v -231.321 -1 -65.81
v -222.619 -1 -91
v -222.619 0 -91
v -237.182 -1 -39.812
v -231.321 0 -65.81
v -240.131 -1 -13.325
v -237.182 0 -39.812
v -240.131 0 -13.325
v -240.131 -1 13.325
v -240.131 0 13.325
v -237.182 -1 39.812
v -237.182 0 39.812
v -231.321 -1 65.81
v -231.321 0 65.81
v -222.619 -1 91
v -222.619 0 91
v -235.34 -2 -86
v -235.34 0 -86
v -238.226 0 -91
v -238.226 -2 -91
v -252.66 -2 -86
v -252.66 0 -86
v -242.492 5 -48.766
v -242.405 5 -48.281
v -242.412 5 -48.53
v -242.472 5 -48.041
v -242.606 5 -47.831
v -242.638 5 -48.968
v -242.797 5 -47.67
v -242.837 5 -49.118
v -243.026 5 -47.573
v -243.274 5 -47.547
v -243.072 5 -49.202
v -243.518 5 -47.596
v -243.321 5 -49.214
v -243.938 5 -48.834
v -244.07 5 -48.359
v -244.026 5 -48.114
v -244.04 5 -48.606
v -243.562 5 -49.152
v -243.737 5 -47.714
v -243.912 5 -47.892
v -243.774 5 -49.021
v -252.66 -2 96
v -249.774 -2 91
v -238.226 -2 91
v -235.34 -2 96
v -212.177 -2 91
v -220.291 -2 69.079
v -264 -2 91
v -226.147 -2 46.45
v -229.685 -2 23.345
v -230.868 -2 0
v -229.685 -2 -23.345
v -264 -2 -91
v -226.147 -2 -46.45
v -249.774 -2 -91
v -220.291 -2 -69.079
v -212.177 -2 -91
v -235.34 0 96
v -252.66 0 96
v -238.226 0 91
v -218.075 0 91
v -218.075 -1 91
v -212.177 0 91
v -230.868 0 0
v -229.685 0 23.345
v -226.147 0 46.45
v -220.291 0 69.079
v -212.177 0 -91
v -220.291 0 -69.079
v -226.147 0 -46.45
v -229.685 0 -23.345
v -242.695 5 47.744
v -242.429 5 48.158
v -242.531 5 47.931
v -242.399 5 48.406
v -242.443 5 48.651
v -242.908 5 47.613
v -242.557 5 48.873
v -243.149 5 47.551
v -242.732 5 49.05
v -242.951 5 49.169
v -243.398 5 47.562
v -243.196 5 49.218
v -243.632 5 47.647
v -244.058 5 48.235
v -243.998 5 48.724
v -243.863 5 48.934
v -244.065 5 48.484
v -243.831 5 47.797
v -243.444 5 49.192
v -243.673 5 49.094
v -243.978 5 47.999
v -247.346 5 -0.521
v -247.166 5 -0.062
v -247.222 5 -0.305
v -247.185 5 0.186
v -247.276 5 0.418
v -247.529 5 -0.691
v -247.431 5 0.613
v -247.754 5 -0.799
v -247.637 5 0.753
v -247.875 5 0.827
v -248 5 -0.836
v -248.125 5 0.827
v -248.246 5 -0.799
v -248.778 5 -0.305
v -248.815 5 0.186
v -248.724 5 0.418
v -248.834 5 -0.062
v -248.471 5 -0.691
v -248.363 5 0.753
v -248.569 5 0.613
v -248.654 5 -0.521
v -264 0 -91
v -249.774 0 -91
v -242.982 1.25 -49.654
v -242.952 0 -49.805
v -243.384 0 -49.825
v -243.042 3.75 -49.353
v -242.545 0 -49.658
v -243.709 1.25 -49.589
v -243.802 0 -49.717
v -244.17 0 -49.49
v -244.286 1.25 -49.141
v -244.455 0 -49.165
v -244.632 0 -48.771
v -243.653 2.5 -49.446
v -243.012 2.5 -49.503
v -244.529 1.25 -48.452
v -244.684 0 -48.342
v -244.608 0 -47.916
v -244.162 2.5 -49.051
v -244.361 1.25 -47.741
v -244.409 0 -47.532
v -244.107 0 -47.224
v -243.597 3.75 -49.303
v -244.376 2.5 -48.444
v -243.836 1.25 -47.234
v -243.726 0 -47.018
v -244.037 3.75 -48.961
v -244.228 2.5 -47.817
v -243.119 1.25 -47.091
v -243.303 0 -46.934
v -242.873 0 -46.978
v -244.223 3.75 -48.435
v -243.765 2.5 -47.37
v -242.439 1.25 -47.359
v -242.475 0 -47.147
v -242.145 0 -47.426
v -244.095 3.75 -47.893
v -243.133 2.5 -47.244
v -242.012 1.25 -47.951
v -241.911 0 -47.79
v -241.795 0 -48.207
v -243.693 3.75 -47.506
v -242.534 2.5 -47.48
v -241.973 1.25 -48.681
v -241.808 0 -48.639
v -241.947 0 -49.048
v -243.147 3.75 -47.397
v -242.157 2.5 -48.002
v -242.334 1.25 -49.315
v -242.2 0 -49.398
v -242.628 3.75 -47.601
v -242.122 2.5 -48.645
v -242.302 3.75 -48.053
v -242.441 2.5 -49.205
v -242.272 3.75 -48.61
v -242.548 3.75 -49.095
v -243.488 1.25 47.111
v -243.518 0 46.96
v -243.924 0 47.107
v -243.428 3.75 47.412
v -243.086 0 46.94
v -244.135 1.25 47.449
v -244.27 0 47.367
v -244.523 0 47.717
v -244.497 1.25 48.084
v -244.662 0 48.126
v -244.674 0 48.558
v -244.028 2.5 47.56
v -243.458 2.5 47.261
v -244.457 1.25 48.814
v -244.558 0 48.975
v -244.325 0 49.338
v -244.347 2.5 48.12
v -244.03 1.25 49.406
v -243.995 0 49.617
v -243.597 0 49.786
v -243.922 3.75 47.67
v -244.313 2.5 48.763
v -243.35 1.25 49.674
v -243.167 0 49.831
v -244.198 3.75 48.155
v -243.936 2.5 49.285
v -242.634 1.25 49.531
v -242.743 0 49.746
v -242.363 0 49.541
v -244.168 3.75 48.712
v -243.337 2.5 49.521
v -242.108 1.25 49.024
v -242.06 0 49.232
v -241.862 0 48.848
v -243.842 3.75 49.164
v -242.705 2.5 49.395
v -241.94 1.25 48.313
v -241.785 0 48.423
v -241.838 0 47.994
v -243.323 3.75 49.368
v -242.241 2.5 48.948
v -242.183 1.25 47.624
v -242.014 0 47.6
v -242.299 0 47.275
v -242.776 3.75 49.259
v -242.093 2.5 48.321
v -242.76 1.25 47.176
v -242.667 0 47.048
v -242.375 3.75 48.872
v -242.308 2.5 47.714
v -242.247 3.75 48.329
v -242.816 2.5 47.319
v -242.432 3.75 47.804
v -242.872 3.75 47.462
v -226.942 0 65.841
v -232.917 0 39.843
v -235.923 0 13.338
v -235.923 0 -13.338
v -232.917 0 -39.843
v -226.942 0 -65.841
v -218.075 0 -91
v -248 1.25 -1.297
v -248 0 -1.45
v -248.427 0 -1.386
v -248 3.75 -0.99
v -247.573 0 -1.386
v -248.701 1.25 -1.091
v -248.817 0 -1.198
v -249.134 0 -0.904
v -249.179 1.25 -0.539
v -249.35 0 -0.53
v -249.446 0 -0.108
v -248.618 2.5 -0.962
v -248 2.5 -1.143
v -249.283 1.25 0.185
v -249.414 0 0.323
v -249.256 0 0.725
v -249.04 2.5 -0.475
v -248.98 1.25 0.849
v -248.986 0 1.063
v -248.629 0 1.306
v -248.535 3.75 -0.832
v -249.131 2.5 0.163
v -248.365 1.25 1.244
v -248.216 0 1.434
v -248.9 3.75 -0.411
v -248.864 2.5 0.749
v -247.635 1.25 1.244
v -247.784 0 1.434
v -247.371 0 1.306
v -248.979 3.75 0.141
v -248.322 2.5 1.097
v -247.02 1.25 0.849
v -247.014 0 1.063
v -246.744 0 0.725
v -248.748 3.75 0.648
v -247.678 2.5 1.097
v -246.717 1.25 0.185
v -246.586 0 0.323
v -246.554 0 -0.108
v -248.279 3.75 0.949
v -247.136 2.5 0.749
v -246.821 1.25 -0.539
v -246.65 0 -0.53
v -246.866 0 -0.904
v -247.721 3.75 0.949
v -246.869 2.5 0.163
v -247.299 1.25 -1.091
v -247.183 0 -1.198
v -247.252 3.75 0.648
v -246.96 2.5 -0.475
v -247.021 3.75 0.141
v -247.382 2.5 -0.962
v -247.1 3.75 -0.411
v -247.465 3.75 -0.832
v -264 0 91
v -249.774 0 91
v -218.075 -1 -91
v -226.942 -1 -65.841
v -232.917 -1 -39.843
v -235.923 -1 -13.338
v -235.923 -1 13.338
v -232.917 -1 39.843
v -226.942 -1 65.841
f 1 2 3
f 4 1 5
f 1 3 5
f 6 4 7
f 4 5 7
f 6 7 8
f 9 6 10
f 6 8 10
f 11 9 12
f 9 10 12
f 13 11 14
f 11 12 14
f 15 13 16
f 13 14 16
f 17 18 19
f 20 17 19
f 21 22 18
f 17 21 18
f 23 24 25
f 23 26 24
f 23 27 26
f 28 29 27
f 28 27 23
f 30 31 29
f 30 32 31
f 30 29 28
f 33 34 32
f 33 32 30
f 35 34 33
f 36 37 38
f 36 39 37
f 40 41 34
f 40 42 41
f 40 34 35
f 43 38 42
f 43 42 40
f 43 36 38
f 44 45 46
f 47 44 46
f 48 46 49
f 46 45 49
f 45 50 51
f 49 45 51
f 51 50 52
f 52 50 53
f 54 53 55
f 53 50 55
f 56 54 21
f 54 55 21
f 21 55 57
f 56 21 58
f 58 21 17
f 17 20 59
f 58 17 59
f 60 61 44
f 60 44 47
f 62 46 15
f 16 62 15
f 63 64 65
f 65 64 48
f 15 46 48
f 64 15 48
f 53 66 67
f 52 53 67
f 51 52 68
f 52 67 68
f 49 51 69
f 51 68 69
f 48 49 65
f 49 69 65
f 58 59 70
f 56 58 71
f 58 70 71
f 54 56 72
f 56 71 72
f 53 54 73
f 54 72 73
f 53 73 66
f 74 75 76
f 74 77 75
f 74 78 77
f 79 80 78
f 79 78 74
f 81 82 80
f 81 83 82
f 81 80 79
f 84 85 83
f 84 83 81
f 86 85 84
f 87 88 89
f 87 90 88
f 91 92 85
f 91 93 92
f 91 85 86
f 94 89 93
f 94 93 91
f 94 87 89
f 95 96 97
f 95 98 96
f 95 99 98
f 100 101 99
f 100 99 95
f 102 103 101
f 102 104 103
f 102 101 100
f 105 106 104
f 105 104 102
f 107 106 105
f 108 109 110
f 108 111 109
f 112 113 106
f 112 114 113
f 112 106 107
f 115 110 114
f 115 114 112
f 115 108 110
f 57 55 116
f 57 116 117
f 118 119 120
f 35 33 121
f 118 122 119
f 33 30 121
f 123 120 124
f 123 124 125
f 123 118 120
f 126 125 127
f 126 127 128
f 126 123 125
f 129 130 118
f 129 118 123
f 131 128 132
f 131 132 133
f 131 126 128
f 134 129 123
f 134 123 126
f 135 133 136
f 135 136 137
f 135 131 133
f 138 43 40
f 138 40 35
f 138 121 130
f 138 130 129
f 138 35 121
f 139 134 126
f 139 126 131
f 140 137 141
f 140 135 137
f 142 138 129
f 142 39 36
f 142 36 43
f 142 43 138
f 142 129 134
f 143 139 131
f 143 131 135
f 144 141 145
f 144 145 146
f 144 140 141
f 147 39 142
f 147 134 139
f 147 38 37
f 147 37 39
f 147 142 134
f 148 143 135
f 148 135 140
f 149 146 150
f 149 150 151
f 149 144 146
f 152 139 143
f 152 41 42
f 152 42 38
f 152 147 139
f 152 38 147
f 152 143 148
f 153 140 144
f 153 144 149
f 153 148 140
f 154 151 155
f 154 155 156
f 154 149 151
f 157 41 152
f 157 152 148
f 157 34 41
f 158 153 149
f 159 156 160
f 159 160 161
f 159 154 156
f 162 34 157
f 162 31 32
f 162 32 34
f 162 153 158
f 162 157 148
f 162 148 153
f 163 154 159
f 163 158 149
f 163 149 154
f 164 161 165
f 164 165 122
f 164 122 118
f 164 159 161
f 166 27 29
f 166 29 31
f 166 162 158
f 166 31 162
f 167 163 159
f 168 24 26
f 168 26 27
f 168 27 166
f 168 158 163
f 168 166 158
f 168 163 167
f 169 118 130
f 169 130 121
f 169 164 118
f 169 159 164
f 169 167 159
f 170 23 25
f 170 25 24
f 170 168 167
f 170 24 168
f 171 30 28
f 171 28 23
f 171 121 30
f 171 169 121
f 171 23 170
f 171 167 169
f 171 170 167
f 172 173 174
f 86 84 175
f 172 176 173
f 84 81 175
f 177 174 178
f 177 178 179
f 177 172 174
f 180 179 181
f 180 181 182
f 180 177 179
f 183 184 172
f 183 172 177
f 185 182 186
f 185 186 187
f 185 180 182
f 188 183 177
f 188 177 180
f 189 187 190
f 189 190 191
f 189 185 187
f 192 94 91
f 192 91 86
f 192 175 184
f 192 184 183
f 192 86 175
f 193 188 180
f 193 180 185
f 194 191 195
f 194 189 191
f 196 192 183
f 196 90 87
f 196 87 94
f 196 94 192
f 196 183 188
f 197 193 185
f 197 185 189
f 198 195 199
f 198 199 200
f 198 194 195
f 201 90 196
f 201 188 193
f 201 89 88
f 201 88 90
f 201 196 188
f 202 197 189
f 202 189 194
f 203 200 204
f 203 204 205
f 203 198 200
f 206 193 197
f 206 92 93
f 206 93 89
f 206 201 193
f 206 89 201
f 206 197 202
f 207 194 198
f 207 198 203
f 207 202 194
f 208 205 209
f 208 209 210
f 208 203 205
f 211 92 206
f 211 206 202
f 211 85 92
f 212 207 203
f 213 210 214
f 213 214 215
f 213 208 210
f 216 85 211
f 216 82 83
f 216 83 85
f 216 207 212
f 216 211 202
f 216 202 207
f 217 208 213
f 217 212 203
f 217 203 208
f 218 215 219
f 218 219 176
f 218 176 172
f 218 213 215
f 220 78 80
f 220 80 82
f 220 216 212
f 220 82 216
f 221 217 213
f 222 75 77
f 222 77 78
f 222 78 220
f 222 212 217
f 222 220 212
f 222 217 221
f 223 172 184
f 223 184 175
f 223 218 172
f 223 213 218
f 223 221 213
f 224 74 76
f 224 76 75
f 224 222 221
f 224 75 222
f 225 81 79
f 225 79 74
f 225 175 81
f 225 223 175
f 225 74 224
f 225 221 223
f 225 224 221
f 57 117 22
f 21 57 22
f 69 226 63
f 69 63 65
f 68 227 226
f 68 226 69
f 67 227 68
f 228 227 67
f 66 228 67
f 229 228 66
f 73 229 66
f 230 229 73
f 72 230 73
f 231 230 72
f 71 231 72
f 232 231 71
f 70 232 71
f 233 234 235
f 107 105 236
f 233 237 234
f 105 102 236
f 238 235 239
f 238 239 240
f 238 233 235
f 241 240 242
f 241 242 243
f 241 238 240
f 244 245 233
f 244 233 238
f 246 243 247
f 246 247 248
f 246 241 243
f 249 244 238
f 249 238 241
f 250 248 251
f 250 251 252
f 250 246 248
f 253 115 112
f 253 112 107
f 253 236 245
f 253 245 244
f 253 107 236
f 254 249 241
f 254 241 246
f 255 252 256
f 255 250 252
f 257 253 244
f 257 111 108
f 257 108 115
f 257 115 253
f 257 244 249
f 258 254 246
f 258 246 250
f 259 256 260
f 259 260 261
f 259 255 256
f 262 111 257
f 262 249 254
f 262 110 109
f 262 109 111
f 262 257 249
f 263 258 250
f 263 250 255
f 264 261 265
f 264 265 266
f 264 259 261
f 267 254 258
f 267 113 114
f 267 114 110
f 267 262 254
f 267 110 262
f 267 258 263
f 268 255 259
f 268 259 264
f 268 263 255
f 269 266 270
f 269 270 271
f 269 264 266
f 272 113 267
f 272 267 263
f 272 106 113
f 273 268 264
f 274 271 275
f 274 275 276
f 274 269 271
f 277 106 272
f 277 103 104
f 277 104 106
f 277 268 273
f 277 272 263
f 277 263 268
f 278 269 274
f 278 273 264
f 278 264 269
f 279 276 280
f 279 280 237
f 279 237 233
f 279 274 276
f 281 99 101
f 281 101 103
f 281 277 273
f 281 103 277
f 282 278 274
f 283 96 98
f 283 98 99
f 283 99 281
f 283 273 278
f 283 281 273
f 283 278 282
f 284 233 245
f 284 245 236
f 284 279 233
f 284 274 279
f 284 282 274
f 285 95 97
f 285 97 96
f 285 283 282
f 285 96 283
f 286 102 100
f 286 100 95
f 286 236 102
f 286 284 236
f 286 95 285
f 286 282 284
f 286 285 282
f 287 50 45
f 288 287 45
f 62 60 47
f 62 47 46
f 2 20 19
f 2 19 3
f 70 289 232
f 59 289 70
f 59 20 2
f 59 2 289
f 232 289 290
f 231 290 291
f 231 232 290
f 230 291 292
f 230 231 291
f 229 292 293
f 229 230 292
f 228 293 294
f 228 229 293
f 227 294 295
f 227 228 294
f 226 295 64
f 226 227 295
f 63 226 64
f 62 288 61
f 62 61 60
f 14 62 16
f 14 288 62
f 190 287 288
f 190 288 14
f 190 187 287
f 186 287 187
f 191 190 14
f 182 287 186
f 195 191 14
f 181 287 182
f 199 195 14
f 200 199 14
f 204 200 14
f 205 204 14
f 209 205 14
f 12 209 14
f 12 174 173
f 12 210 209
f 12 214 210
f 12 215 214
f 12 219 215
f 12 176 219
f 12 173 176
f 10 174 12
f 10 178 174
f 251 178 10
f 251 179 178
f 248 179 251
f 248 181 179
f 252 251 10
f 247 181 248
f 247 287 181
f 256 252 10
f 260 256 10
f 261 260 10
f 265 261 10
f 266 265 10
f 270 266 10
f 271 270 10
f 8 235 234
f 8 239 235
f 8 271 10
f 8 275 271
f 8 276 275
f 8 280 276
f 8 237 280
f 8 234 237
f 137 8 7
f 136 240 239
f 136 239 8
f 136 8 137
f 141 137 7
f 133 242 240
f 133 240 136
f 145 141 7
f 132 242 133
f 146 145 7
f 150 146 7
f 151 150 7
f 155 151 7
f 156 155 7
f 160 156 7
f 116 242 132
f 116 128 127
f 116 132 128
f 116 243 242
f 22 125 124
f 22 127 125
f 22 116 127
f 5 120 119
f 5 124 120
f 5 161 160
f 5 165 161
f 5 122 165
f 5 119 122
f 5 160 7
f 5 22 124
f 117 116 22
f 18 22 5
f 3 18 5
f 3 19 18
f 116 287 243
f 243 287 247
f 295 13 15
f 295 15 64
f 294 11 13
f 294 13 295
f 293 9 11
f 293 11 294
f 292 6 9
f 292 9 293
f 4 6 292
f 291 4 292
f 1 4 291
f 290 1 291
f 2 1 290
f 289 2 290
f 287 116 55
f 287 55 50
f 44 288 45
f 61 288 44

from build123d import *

# Parameters (mm, degrees)
BASEPLATE_PROFILE_DEPTH               = 2
SKETCH2_R                             = 1.45
M3_PINS_DEPTH                         = 5
M3_PINS_TAPER                         = 7
CIRPATTERN1_COUNT                     = 32
SKETCH4_R                             = 1
PILLAR_PINS_DEPTH                     = 5
PILLAR_PINS_DRAFT                     = 6
PILLAR_PINS_PROFILE_2_DEPTH           = 5
PILLAR_PINS_PROFILE_2_DRAFT           = 6
CIRPATTERN2_COPY_1_SKETCH_R           = 1
CIRPATTERN2_COPY_1_DEPTH              = 5
CIRPATTERN2_COPY_1_DRAFT              = 6
CIRPATTERN2_COPY_2_SKETCH_R           = 1
CIRPATTERN2_COPY_2_DEPTH              = 5
CIRPATTERN2_COPY_2_DRAFT              = 6
CIRPATTERN2_COPY_3_SKETCH_R           = 1
CIRPATTERN2_COPY_3_DEPTH              = 5
CIRPATTERN2_COPY_3_DRAFT              = 6
CIRPATTERN2_COPY_4_SKETCH_R           = 1
CIRPATTERN2_COPY_4_DEPTH              = 5
CIRPATTERN2_COPY_4_DRAFT              = 6
CIRPATTERN2_COPY_5_SKETCH_R           = 1
CIRPATTERN2_COPY_5_DEPTH              = 5
CIRPATTERN2_COPY_5_DRAFT              = 6
CIRPATTERN2_COPY_6_SKETCH_R           = 1
CIRPATTERN2_COPY_6_DEPTH              = 5
CIRPATTERN2_COPY_6_DRAFT              = 6
CIRPATTERN2_COPY_7_SKETCH_R           = 1
CIRPATTERN2_COPY_7_DEPTH              = 5
CIRPATTERN2_COPY_7_DRAFT              = 6
CIRPATTERN2_COPY_8_SKETCH_R           = 1
CIRPATTERN2_COPY_8_DEPTH              = 5
CIRPATTERN2_COPY_8_DRAFT              = 6
CIRPATTERN2_COPY_9_SKETCH_R           = 1
CIRPATTERN2_COPY_9_DEPTH              = 5
CIRPATTERN2_COPY_9_DRAFT              = 6
CIRPATTERN2_COPY_10_SKETCH_R          = 1
CIRPATTERN2_COPY_10_DEPTH             = 5
CIRPATTERN2_COPY_10_DRAFT             = 6
CIRPATTERN2_COPY_11_SKETCH_R          = 1
CIRPATTERN2_COPY_11_DEPTH             = 5
CIRPATTERN2_COPY_11_DRAFT             = 6
CIRPATTERN2_COPY_12_SKETCH_R          = 1
CIRPATTERN2_COPY_12_DEPTH             = 5
CIRPATTERN2_COPY_12_DRAFT             = 6
CIRPATTERN2_COPY_13_SKETCH_R          = 1
CIRPATTERN2_COPY_13_DEPTH             = 5
CIRPATTERN2_COPY_13_DRAFT             = 6
CIRPATTERN2_COPY_14_SKETCH_R          = 1
CIRPATTERN2_COPY_14_DEPTH             = 5
CIRPATTERN2_COPY_14_DRAFT             = 6
CIRPATTERN2_COPY_15_SKETCH_R          = 1
CIRPATTERN2_COPY_15_DEPTH             = 5
CIRPATTERN2_COPY_15_DRAFT             = 6
SKETCH5_R                             = 3
M8_HOLE_1_DEPTH                       = 5
M8_HOLE_1_TAPER                       = 12
M8_1_PATTERN_COUNT                    = 4
SKETCH6_R                             = 3
EXTRUDE_M8_2_DEPTH                    = 5
EXTRUDE_M8_2_TAPER                    = 12
M8_2_PATTERN_COUNT                    = 4
PATTERN_CIRCULAR_M8_3_COUNT           = 2
PATTERN_CIRCULAR_M8_3_ANGLE           = 36.9
PATTERN_CIRCULAR_M8_3_COPY_1_SKETCH_R = 3
PATTERN_CIRCULAR_M8_3_COPY_1_DEPTH    = 5
PATTERN_CIRCULAR_M8_3_COPY_1_TAPER    = 12
PATTERN_CIRCULAR_M8_3_COPY_2_SKETCH_R = 3
PATTERN_CIRCULAR_M8_3_COPY_2_DEPTH    = 5
PATTERN_CIRCULAR_M8_3_COPY_2_TAPER    = 12
PATTERN_CIRCULAR_M8_3_COPY_3_SKETCH_R = 3
PATTERN_CIRCULAR_M8_3_COPY_3_DEPTH    = 5
PATTERN_CIRCULAR_M8_3_COPY_3_TAPER    = 12
CUT_CENTER_DEPTH                      = 374.385859402
CIRPATTERN7_COUNT                     = 6
SKETCH12_W                            = 610.181250352
SKETCH12_H                            = 664.04441738
SKETCH12_W_2                          = 90
SKETCH12_H_2                          = 182
CUT_EXTRUDE1_DEPTH                    = 10
BOSS_EXTRUDE1_DEPTH                   = 2
CUT_EXTRUDE2_DEPTH                    = 2
SKETCH15_R                            = 240.5
SKETCH15_R_2                          = 236.3
ORING_SPACE_DEPTH                     = 1


with BuildPart() as part:
    # Sketch1 → baseplate profile (new body)
    with BuildSketch(Plane(origin=(0, 0, 0), x_dir=(1, 0, 0), z_dir=(0, 1, 0))):
        Polygon((264, 0), (264, 131.98), (131.979594929, 264), (0, 264), (-131.98, 264), (-264, 131.979594929), (-264, 0), (-264, -131.98), (-131.979594929, -264), (0, -264), (131.98, -264), (264, -131.979594929), align=None)
    extrude(amount=-BASEPLATE_PROFILE_DEPTH)

    # Sketch2 → M3 pins (add)
    with BuildSketch(Plane(origin=(0, 0, 0), x_dir=(1, 0, 0), z_dir=(0, 1, 0))):
        with Locations((0, 248)):
            Circle(SKETCH2_R)
    m3_pins = extrude(amount=M3_PINS_DEPTH, taper=M3_PINS_TAPER)

    # CirPattern1: M3 pins ×32 about axis
    cirpattern1_axis = Axis((0, 0, 0), (0, 1, 0))
    for i in range(1, CIRPATTERN1_COUNT):
        add(m3_pins.rotate(cirpattern1_axis, i * 360 / CIRPATTERN1_COUNT))


with BuildPart() as pillar_pins_tool:
    # Sketch4 → pillar pins (with draft: the straight prism first)
    with BuildSketch(Plane(origin=(0, 0, 0), x_dir=(1, 0, 0), z_dir=(0, 1, 0))):
        with Locations((9, 201)):
            Circle(SKETCH4_R)
    extrude(amount=PILLAR_PINS_DEPTH)
    # pillar pins: the draft: its side faces are tilted about the plane it starts from
    pillar_pins_sides = [pillar_pins_tool.faces().sort_by_distance(p)[0] for p in [
        (8, 2.5, -201),
    ]]
    draft(pillar_pins_sides, Plane(origin=(0, 0, 0), x_dir=(1, 0, 0), z_dir=(0, 1, 0)), PILLAR_PINS_DRAFT)


with BuildPart() as part_1:
    add(part.part)

    # pillar pins: add pillar_pins_tool
    add(pillar_pins_tool.part)


with BuildPart() as pillar_pins_profile_2_tool:
    # Sketch4 → pillar pins profile 2 (with draft: the straight prism first)
    with BuildSketch(Plane(origin=(0, 0, 0), x_dir=(1, 0, 0), z_dir=(0, 1, 0))):
        with Locations((-9, 201)):
            Circle(SKETCH4_R)
    extrude(amount=PILLAR_PINS_PROFILE_2_DEPTH)
    # pillar pins profile 2: the draft: its side faces are tilted about the plane it starts from
    pillar_pins_profile_2_sides = [pillar_pins_profile_2_tool.faces().sort_by_distance(p)[0] for p in [
        (-10, 2.5, -201),
    ]]
    draft(pillar_pins_profile_2_sides, Plane(origin=(0, 0, 0), x_dir=(1, 0, 0), z_dir=(0, 1, 0)), PILLAR_PINS_PROFILE_2_DRAFT)


with BuildPart() as part_2:
    add(part_1.part)

    # pillar pins profile 2: add pillar_pins_profile_2_tool
    add(pillar_pins_profile_2_tool.part)


with BuildPart() as cirpattern2_copy_1_tool:
    # CirPattern2 copy 1 sketch → CirPattern2 copy 1 (with draft: the straight prism first)
    with BuildSketch(Plane(origin=(0, 0, 0), x_dir=(0.5000000000000001, 0, -0.8660254037844386), z_dir=(0, 1, 0))):
        with Locations((9, 201)):
            Circle(CIRPATTERN2_COPY_1_SKETCH_R)
    extrude(amount=CIRPATTERN2_COPY_1_DEPTH)
    # CirPattern2 copy 1: the draft: its side faces are tilted about the plane it starts from
    cirpattern2_copy_1_sides = [cirpattern2_copy_1_tool.faces().sort_by_distance(p)[0] for p in [
        (-170.071106161, 2.5, -107.42820323),
    ]]
    draft(cirpattern2_copy_1_sides, Plane(origin=(0, 0, 0), x_dir=(0.5000000000000001, 0, -0.8660254037844386), z_dir=(0, 1, 0)), CIRPATTERN2_COPY_1_DRAFT)


with BuildPart() as part_3:
    add(part_2.part)

    # CirPattern2 copy 1: add cirpattern2_copy_1_tool
    add(cirpattern2_copy_1_tool.part)


with BuildPart() as cirpattern2_copy_2_tool:
    # CirPattern2 copy 2 sketch → CirPattern2 copy 2 (with draft: the straight prism first)
    with BuildSketch(Plane(origin=(0, 0, 0), x_dir=(-0.4999999999999998, 0, -0.8660254037844387), z_dir=(0, 1, 0))):
        with Locations((9, 201)):
            Circle(CIRPATTERN2_COPY_2_SKETCH_R)
    extrude(amount=CIRPATTERN2_COPY_2_DEPTH)
    # CirPattern2 copy 2: the draft: its side faces are tilted about the plane it starts from
    cirpattern2_copy_2_sides = [cirpattern2_copy_2_tool.faces().sort_by_distance(p)[0] for p in [
        (-178.071106161, 2.5, 93.57179677),
    ]]
    draft(cirpattern2_copy_2_sides, Plane(origin=(0, 0, 0), x_dir=(-0.4999999999999998, 0, -0.8660254037844387), z_dir=(0, 1, 0)), CIRPATTERN2_COPY_2_DRAFT)


with BuildPart() as part_4:
    add(part_3.part)

    # CirPattern2 copy 2: add cirpattern2_copy_2_tool
    add(cirpattern2_copy_2_tool.part)


with BuildPart() as cirpattern2_copy_3_tool:
    # CirPattern2 copy 3 sketch → CirPattern2 copy 3 (with draft: the straight prism first)
    with BuildSketch(Plane(origin=(0, 0, 0), x_dir=(-1, 0, 0), z_dir=(0, 1, 0))):
        with Locations((9, 201)):
            Circle(CIRPATTERN2_COPY_3_SKETCH_R)
    extrude(amount=CIRPATTERN2_COPY_3_DEPTH)
    # CirPattern2 copy 3: the draft: its side faces are tilted about the plane it starts from
    cirpattern2_copy_3_sides = [cirpattern2_copy_3_tool.faces().sort_by_distance(p)[0] for p in [
        (-8, 2.5, 201),
    ]]
    draft(cirpattern2_copy_3_sides, Plane(origin=(0, 0, 0), x_dir=(-1, 0, 0), z_dir=(0, 1, 0)), CIRPATTERN2_COPY_3_DRAFT)


with BuildPart() as part_5:
    add(part_4.part)

    # CirPattern2 copy 3: add cirpattern2_copy_3_tool
    add(cirpattern2_copy_3_tool.part)


with BuildPart() as cirpattern2_copy_4_tool:
    # CirPattern2 copy 4 sketch → CirPattern2 copy 4 (with draft: the straight prism first)
    with BuildSketch(Plane(origin=(0, 0, 0), x_dir=(-0.5000000000000004, 0, 0.8660254037844384), z_dir=(0, 1, 0))):
        with Locations((9, 201)):
            Circle(CIRPATTERN2_COPY_4_SKETCH_R)
    extrude(amount=CIRPATTERN2_COPY_4_DEPTH)
    # CirPattern2 copy 4: the draft: its side faces are tilted about the plane it starts from
    cirpattern2_copy_4_sides = [cirpattern2_copy_4_tool.faces().sort_by_distance(p)[0] for p in [
        (170.071106161, 2.5, 107.42820323),
    ]]
    draft(cirpattern2_copy_4_sides, Plane(origin=(0, 0, 0), x_dir=(-0.5000000000000004, 0, 0.8660254037844384), z_dir=(0, 1, 0)), CIRPATTERN2_COPY_4_DRAFT)


with BuildPart() as part_6:
    add(part_5.part)

    # CirPattern2 copy 4: add cirpattern2_copy_4_tool
    add(cirpattern2_copy_4_tool.part)


with BuildPart() as cirpattern2_copy_5_tool:
    # CirPattern2 copy 5 sketch → CirPattern2 copy 5 (with draft: the straight prism first)
    with BuildSketch(Plane(origin=(0, 0, 0), x_dir=(0.5000000000000001, 0, 0.8660254037844386), z_dir=(0, 1, 0))):
        with Locations((9, 201)):
            Circle(CIRPATTERN2_COPY_5_SKETCH_R)
    extrude(amount=CIRPATTERN2_COPY_5_DEPTH)
    # CirPattern2 copy 5: the draft: its side faces are tilted about the plane it starts from
    cirpattern2_copy_5_sides = [cirpattern2_copy_5_tool.faces().sort_by_distance(p)[0] for p in [
        (178.071106161, 2.5, -93.57179677),
    ]]
    draft(cirpattern2_copy_5_sides, Plane(origin=(0, 0, 0), x_dir=(0.5000000000000001, 0, 0.8660254037844386), z_dir=(0, 1, 0)), CIRPATTERN2_COPY_5_DRAFT)


with BuildPart() as part_7:
    add(part_6.part)

    # CirPattern2 copy 5: add cirpattern2_copy_5_tool
    add(cirpattern2_copy_5_tool.part)


with BuildPart() as cirpattern2_copy_6_tool:
    # CirPattern2 copy 6 sketch → CirPattern2 copy 6 (with draft: the straight prism first)
    with BuildSketch(Plane(origin=(0, 0, 0), x_dir=(0.5000000000000001, 0, -0.8660254037844386), z_dir=(0, 1, 0))):
        with Locations((-9, 201)):
            Circle(CIRPATTERN2_COPY_6_SKETCH_R)
    extrude(amount=CIRPATTERN2_COPY_6_DEPTH)
    # CirPattern2 copy 6: the draft: its side faces are tilted about the plane it starts from
    cirpattern2_copy_6_sides = [cirpattern2_copy_6_tool.faces().sort_by_distance(p)[0] for p in [
        (-179.071106161, 2.5, -91.839745962),
    ]]
    draft(cirpattern2_copy_6_sides, Plane(origin=(0, 0, 0), x_dir=(0.5000000000000001, 0, -0.8660254037844386), z_dir=(0, 1, 0)), CIRPATTERN2_COPY_6_DRAFT)


with BuildPart() as part_8:
    add(part_7.part)

    # CirPattern2 copy 6: add cirpattern2_copy_6_tool
    add(cirpattern2_copy_6_tool.part)


with BuildPart() as cirpattern2_copy_7_tool:
    # CirPattern2 copy 7 sketch → CirPattern2 copy 7 (with draft: the straight prism first)
    with BuildSketch(Plane(origin=(0, 0, 0), x_dir=(-0.4999999999999998, 0, -0.8660254037844387), z_dir=(0, 1, 0))):
        with Locations((-9, 201)):
            Circle(CIRPATTERN2_COPY_7_SKETCH_R)
    extrude(amount=CIRPATTERN2_COPY_7_DEPTH)
    # CirPattern2 copy 7: the draft: its side faces are tilted about the plane it starts from
    cirpattern2_copy_7_sides = [cirpattern2_copy_7_tool.faces().sort_by_distance(p)[0] for p in [
        (-169.071106161, 2.5, 109.160254038),
    ]]
    draft(cirpattern2_copy_7_sides, Plane(origin=(0, 0, 0), x_dir=(-0.4999999999999998, 0, -0.8660254037844387), z_dir=(0, 1, 0)), CIRPATTERN2_COPY_7_DRAFT)


with BuildPart() as part_9:
    add(part_8.part)

    # CirPattern2 copy 7: add cirpattern2_copy_7_tool
    add(cirpattern2_copy_7_tool.part)


with BuildPart() as cirpattern2_copy_8_tool:
    # CirPattern2 copy 8 sketch → CirPattern2 copy 8 (with draft: the straight prism first)
    with BuildSketch(Plane(origin=(0, 0, 0), x_dir=(-1, 0, 0), z_dir=(0, 1, 0))):
        with Locations((-9, 201)):
            Circle(CIRPATTERN2_COPY_8_SKETCH_R)
    extrude(amount=CIRPATTERN2_COPY_8_DEPTH)
    # CirPattern2 copy 8: the draft: its side faces are tilted about the plane it starts from
    cirpattern2_copy_8_sides = [cirpattern2_copy_8_tool.faces().sort_by_distance(p)[0] for p in [
        (10, 2.5, 201),
    ]]
    draft(cirpattern2_copy_8_sides, Plane(origin=(0, 0, 0), x_dir=(-1, 0, 0), z_dir=(0, 1, 0)), CIRPATTERN2_COPY_8_DRAFT)


with BuildPart() as part_10:
    add(part_9.part)

    # CirPattern2 copy 8: add cirpattern2_copy_8_tool
    add(cirpattern2_copy_8_tool.part)


with BuildPart() as cirpattern2_copy_9_tool:
    # CirPattern2 copy 9 sketch → CirPattern2 copy 9 (with draft: the straight prism first)
    with BuildSketch(Plane(origin=(0, 0, 0), x_dir=(-0.5000000000000004, 0, 0.8660254037844384), z_dir=(0, 1, 0))):
        with Locations((-9, 201)):
            Circle(CIRPATTERN2_COPY_9_SKETCH_R)
    extrude(amount=CIRPATTERN2_COPY_9_DEPTH)
    # CirPattern2 copy 9: the draft: its side faces are tilted about the plane it starts from
    cirpattern2_copy_9_sides = [cirpattern2_copy_9_tool.faces().sort_by_distance(p)[0] for p in [
        (179.071106161, 2.5, 91.839745962),
    ]]
    draft(cirpattern2_copy_9_sides, Plane(origin=(0, 0, 0), x_dir=(-0.5000000000000004, 0, 0.8660254037844384), z_dir=(0, 1, 0)), CIRPATTERN2_COPY_9_DRAFT)


with BuildPart() as part_11:
    add(part_10.part)

    # CirPattern2 copy 9: add cirpattern2_copy_9_tool
    add(cirpattern2_copy_9_tool.part)


with BuildPart() as cirpattern2_copy_10_tool:
    # CirPattern2 copy 10 sketch → CirPattern2 copy 10 (with draft: the straight prism first)
    with BuildSketch(Plane(origin=(0, 0, 0), x_dir=(0.5000000000000001, 0, 0.8660254037844386), z_dir=(0, 1, 0))):
        with Locations((-9, 201)):
            Circle(CIRPATTERN2_COPY_10_SKETCH_R)
    extrude(amount=CIRPATTERN2_COPY_10_DEPTH)
    # CirPattern2 copy 10: the draft: its side faces are tilted about the plane it starts from
    cirpattern2_copy_10_sides = [cirpattern2_copy_10_tool.faces().sort_by_distance(p)[0] for p in [
        (169.071106161, 2.5, -109.160254038),
    ]]
    draft(cirpattern2_copy_10_sides, Plane(origin=(0, 0, 0), x_dir=(0.5000000000000001, 0, 0.8660254037844386), z_dir=(0, 1, 0)), CIRPATTERN2_COPY_10_DRAFT)


with BuildPart() as part_12:
    add(part_11.part)

    # CirPattern2 copy 10: add cirpattern2_copy_10_tool
    add(cirpattern2_copy_10_tool.part)


with BuildPart() as cirpattern2_copy_11_tool:
    # CirPattern2 copy 11 sketch → CirPattern2 copy 11 (with draft: the straight prism first)
    with BuildSketch(Plane(origin=(0, 0, 0), x_dir=(0.5000000000000001, 0, -0.8660254037844386), z_dir=(0, 1, 0))):
        with Locations((-9, 201)):
            Circle(CIRPATTERN2_COPY_11_SKETCH_R)
    extrude(amount=CIRPATTERN2_COPY_11_DEPTH)
    # CirPattern2 copy 11: the draft: its side faces are tilted about the plane it starts from
    cirpattern2_copy_11_sides = [cirpattern2_copy_11_tool.faces().sort_by_distance(p)[0] for p in [
        (-179.071106161, 2.5, -91.839745962),
    ]]
    draft(cirpattern2_copy_11_sides, Plane(origin=(0, 0, 0), x_dir=(0.5000000000000001, 0, -0.8660254037844386), z_dir=(0, 1, 0)), CIRPATTERN2_COPY_11_DRAFT)


with BuildPart() as part_13:
    add(part_12.part)

    # CirPattern2 copy 11: add cirpattern2_copy_11_tool
    add(cirpattern2_copy_11_tool.part)


with BuildPart() as cirpattern2_copy_12_tool:
    # CirPattern2 copy 12 sketch → CirPattern2 copy 12 (with draft: the straight prism first)
    with BuildSketch(Plane(origin=(0, 0, 0), x_dir=(-0.4999999999999998, 0, -0.8660254037844387), z_dir=(0, 1, 0))):
        with Locations((-9, 201)):
            Circle(CIRPATTERN2_COPY_12_SKETCH_R)
    extrude(amount=CIRPATTERN2_COPY_12_DEPTH)
    # CirPattern2 copy 12: the draft: its side faces are tilted about the plane it starts from
    cirpattern2_copy_12_sides = [cirpattern2_copy_12_tool.faces().sort_by_distance(p)[0] for p in [
        (-169.071106161, 2.5, 109.160254038),
    ]]
    draft(cirpattern2_copy_12_sides, Plane(origin=(0, 0, 0), x_dir=(-0.4999999999999998, 0, -0.8660254037844387), z_dir=(0, 1, 0)), CIRPATTERN2_COPY_12_DRAFT)


with BuildPart() as part_14:
    add(part_13.part)

    # CirPattern2 copy 12: add cirpattern2_copy_12_tool
    add(cirpattern2_copy_12_tool.part)


with BuildPart() as cirpattern2_copy_13_tool:
    # CirPattern2 copy 13 sketch → CirPattern2 copy 13 (with draft: the straight prism first)
    with BuildSketch(Plane(origin=(0, 0, 0), x_dir=(-1, 0, 0), z_dir=(0, 1, 0))):
        with Locations((-9, 201)):
            Circle(CIRPATTERN2_COPY_13_SKETCH_R)
    extrude(amount=CIRPATTERN2_COPY_13_DEPTH)
    # CirPattern2 copy 13: the draft: its side faces are tilted about the plane it starts from
    cirpattern2_copy_13_sides = [cirpattern2_copy_13_tool.faces().sort_by_distance(p)[0] for p in [
        (10, 2.5, 201),
    ]]
    draft(cirpattern2_copy_13_sides, Plane(origin=(0, 0, 0), x_dir=(-1, 0, 0), z_dir=(0, 1, 0)), CIRPATTERN2_COPY_13_DRAFT)


with BuildPart() as part_15:
    add(part_14.part)

    # CirPattern2 copy 13: add cirpattern2_copy_13_tool
    add(cirpattern2_copy_13_tool.part)


with BuildPart() as cirpattern2_copy_14_tool:
    # CirPattern2 copy 14 sketch → CirPattern2 copy 14 (with draft: the straight prism first)
    with BuildSketch(Plane(origin=(0, 0, 0), x_dir=(-0.5000000000000004, 0, 0.8660254037844384), z_dir=(0, 1, 0))):
        with Locations((-9, 201)):
            Circle(CIRPATTERN2_COPY_14_SKETCH_R)
    extrude(amount=CIRPATTERN2_COPY_14_DEPTH)
    # CirPattern2 copy 14: the draft: its side faces are tilted about the plane it starts from
    cirpattern2_copy_14_sides = [cirpattern2_copy_14_tool.faces().sort_by_distance(p)[0] for p in [
        (179.071106161, 2.5, 91.839745962),
    ]]
    draft(cirpattern2_copy_14_sides, Plane(origin=(0, 0, 0), x_dir=(-0.5000000000000004, 0, 0.8660254037844384), z_dir=(0, 1, 0)), CIRPATTERN2_COPY_14_DRAFT)


with BuildPart() as part_16:
    add(part_15.part)

    # CirPattern2 copy 14: add cirpattern2_copy_14_tool
    add(cirpattern2_copy_14_tool.part)


with BuildPart() as cirpattern2_copy_15_tool:
    # CirPattern2 copy 15 sketch → CirPattern2 copy 15 (with draft: the straight prism first)
    with BuildSketch(Plane(origin=(0, 0, 0), x_dir=(0.5000000000000001, 0, 0.8660254037844386), z_dir=(0, 1, 0))):
        with Locations((-9, 201)):
            Circle(CIRPATTERN2_COPY_15_SKETCH_R)
    extrude(amount=CIRPATTERN2_COPY_15_DEPTH)
    # CirPattern2 copy 15: the draft: its side faces are tilted about the plane it starts from
    cirpattern2_copy_15_sides = [cirpattern2_copy_15_tool.faces().sort_by_distance(p)[0] for p in [
        (169.071106161, 2.5, -109.160254038),
    ]]
    draft(cirpattern2_copy_15_sides, Plane(origin=(0, 0, 0), x_dir=(0.5000000000000001, 0, 0.8660254037844386), z_dir=(0, 1, 0)), CIRPATTERN2_COPY_15_DRAFT)


with BuildPart() as part_17:
    add(part_16.part)

    # CirPattern2 copy 15: add cirpattern2_copy_15_tool
    add(cirpattern2_copy_15_tool.part)

    # Sketch5 → M8 hole -1 (add)
    with BuildSketch(Plane(origin=(0, 0, 0), x_dir=(1, 0, 0), z_dir=(0, 1, 0))):
        with Locations((-193.040151264, 193.040151264)):
            Circle(SKETCH5_R)
    m8_hole_1 = extrude(amount=M8_HOLE_1_DEPTH, taper=M8_HOLE_1_TAPER)

    # M8 -1 pattern: M8 hole -1 ×4 about axis
    m8_1_pattern_axis = Axis((0, 0, 0), (0, 1, 0))
    for i in range(1, M8_1_PATTERN_COUNT):
        add(m8_hole_1.rotate(m8_1_pattern_axis, i * 360 / M8_1_PATTERN_COUNT))

    # Sketch6 → M8 -2 (add)
    with BuildSketch(Plane(origin=(0, 0, 0), x_dir=(1, 0, 0), z_dir=(0, 1, 0))):
        with Locations((-125, -250)):
            Circle(SKETCH6_R)
    extrude_m8_2 = extrude(amount=EXTRUDE_M8_2_DEPTH, taper=EXTRUDE_M8_2_TAPER)

    # M8 -2 pattern: M8 -2 ×4 about axis
    m8_2_pattern_axis = Axis((0, 0, 0), (0, 1, 0))
    for i in range(1, M8_2_PATTERN_COUNT):
        add(extrude_m8_2.rotate(m8_2_pattern_axis, i * 360 / M8_2_PATTERN_COUNT))

    # M8 -3: M8 -2 ×2 about axis
    pattern_circular_m8_3_axis = Axis((0, 0, 0), (0, -1, 0))
    for i in range(1, PATTERN_CIRCULAR_M8_3_COUNT):
        add(extrude_m8_2.rotate(pattern_circular_m8_3_axis, i * PATTERN_CIRCULAR_M8_3_ANGLE / (PATTERN_CIRCULAR_M8_3_COUNT - 1)))

    # M8 -3 copy 1 sketch → M8 -3 copy 1 (add)
    with BuildSketch(Plane(origin=(0, 0, 0), x_dir=(0.6004202253258852, 0, -0.7996846584870897), z_dir=(0, 1, 0))):
        with Locations((-125, -250)):
            Circle(PATTERN_CIRCULAR_M8_3_COPY_1_SKETCH_R)
    extrude(amount=PATTERN_CIRCULAR_M8_3_COPY_1_DEPTH, taper=PATTERN_CIRCULAR_M8_3_COPY_1_TAPER)

    # M8 -3 copy 2 sketch → M8 -3 copy 2 (add)
    with BuildSketch(Plane(origin=(0, 0, 0), x_dir=(-0.7996846584870896, 0, -0.6004202253258853), z_dir=(0, 1, 0))):
        with Locations((-125, -250)):
            Circle(PATTERN_CIRCULAR_M8_3_COPY_2_SKETCH_R)
    extrude(amount=PATTERN_CIRCULAR_M8_3_COPY_2_DEPTH, taper=PATTERN_CIRCULAR_M8_3_COPY_2_TAPER)

    # M8 -3 copy 3 sketch → M8 -3 copy 3 (add)
    with BuildSketch(Plane(origin=(0, 0, 0), x_dir=(-0.6004202253258853, 0, 0.7996846584870896), z_dir=(0, 1, 0))):
        with Locations((-125, -250)):
            Circle(PATTERN_CIRCULAR_M8_3_COPY_3_SKETCH_R)
    extrude(amount=PATTERN_CIRCULAR_M8_3_COPY_3_DEPTH, taper=PATTERN_CIRCULAR_M8_3_COPY_3_TAPER)

    # Sketch8 → cut center (cut, through all)
    with BuildSketch(Plane(origin=(0, 0, 0), x_dir=(1, 0, 0), z_dir=(0, 1, 0))):
        with BuildLine():
            Line((115.433963806, -199.937490231), (0, 0))
            Line((0, 0), (0, -180))
            Line((0, -180), (20, -180))
            Line((20, -180), (20, -230))
            ThreePointArc((20, -230), (69.365180469, -220.200980331), (115.433963806, -199.937490231))
        make_face()
        with BuildLine():
            Line((0, -180), (0, 0))
            Line((0, 0), (-115.433963806, -199.937490231))
            ThreePointArc((-115.433963806, -199.937490231), (-69.365180469, -220.200980331), (-20, -230))
            Line((-20, -230), (-20, -180))
            Line((-20, -180), (0, -180))
        make_face()
    cut_center = extrude(amount=-CUT_CENTER_DEPTH, mode=Mode.SUBTRACT)

    # CirPattern7: cut center ×6 about axis
    cirpattern7_axis = Axis((0, 0, 0), (0, 1, 0))
    for i in range(1, CIRPATTERN7_COUNT):
        add(cut_center.rotate(cirpattern7_axis, i * 360 / CIRPATTERN7_COUNT), mode=Mode.SUBTRACT)

    # Sketch12 → Cut-Extrude1 (cut)
    with BuildSketch(Plane.XZ.offset(2)):
        with Locations((-1.205891799, -1.607855732)):
            Rectangle(SKETCH12_W, SKETCH12_H)
        with Locations((-245, 0)):
            Rectangle(SKETCH12_W_2, SKETCH12_H_2, mode=Mode.SUBTRACT)
    extrude(amount=-CUT_EXTRUDE1_DEPTH, mode=Mode.SUBTRACT)

    # Sketch13 → Boss-Extrude1 (add)
    with BuildSketch(Plane(origin=(0, 0, 0), x_dir=(1, 0, 0), z_dir=(0, 1, 0))):
        Polygon((-252.660254038, -96), (-235.339745962, -96), (-244, -81), align=None)
    extrude(amount=-BOSS_EXTRUDE1_DEPTH)

    # Sketch14 → Cut-Extrude2 (cut)
    with BuildSketch(Plane(origin=(0, 0, 0), x_dir=(1, 0, 0), z_dir=(0, 1, 0))):
        Polygon((-252.660254038, 86), (-235.339745962, 86), (-244, 101), align=None)
    extrude(amount=-CUT_EXTRUDE2_DEPTH, mode=Mode.SUBTRACT)

    # Sketch15 → oring space (cut)
    with BuildSketch(Plane(origin=(0, 0, 0), x_dir=(1, 0, 0), z_dir=(0, 1, 0))):
        Circle(SKETCH15_R)
        Circle(SKETCH15_R_2, mode=Mode.SUBTRACT)
    extrude(amount=-ORING_SPACE_DEPTH, mode=Mode.SUBTRACT)


solid = part_17.part
